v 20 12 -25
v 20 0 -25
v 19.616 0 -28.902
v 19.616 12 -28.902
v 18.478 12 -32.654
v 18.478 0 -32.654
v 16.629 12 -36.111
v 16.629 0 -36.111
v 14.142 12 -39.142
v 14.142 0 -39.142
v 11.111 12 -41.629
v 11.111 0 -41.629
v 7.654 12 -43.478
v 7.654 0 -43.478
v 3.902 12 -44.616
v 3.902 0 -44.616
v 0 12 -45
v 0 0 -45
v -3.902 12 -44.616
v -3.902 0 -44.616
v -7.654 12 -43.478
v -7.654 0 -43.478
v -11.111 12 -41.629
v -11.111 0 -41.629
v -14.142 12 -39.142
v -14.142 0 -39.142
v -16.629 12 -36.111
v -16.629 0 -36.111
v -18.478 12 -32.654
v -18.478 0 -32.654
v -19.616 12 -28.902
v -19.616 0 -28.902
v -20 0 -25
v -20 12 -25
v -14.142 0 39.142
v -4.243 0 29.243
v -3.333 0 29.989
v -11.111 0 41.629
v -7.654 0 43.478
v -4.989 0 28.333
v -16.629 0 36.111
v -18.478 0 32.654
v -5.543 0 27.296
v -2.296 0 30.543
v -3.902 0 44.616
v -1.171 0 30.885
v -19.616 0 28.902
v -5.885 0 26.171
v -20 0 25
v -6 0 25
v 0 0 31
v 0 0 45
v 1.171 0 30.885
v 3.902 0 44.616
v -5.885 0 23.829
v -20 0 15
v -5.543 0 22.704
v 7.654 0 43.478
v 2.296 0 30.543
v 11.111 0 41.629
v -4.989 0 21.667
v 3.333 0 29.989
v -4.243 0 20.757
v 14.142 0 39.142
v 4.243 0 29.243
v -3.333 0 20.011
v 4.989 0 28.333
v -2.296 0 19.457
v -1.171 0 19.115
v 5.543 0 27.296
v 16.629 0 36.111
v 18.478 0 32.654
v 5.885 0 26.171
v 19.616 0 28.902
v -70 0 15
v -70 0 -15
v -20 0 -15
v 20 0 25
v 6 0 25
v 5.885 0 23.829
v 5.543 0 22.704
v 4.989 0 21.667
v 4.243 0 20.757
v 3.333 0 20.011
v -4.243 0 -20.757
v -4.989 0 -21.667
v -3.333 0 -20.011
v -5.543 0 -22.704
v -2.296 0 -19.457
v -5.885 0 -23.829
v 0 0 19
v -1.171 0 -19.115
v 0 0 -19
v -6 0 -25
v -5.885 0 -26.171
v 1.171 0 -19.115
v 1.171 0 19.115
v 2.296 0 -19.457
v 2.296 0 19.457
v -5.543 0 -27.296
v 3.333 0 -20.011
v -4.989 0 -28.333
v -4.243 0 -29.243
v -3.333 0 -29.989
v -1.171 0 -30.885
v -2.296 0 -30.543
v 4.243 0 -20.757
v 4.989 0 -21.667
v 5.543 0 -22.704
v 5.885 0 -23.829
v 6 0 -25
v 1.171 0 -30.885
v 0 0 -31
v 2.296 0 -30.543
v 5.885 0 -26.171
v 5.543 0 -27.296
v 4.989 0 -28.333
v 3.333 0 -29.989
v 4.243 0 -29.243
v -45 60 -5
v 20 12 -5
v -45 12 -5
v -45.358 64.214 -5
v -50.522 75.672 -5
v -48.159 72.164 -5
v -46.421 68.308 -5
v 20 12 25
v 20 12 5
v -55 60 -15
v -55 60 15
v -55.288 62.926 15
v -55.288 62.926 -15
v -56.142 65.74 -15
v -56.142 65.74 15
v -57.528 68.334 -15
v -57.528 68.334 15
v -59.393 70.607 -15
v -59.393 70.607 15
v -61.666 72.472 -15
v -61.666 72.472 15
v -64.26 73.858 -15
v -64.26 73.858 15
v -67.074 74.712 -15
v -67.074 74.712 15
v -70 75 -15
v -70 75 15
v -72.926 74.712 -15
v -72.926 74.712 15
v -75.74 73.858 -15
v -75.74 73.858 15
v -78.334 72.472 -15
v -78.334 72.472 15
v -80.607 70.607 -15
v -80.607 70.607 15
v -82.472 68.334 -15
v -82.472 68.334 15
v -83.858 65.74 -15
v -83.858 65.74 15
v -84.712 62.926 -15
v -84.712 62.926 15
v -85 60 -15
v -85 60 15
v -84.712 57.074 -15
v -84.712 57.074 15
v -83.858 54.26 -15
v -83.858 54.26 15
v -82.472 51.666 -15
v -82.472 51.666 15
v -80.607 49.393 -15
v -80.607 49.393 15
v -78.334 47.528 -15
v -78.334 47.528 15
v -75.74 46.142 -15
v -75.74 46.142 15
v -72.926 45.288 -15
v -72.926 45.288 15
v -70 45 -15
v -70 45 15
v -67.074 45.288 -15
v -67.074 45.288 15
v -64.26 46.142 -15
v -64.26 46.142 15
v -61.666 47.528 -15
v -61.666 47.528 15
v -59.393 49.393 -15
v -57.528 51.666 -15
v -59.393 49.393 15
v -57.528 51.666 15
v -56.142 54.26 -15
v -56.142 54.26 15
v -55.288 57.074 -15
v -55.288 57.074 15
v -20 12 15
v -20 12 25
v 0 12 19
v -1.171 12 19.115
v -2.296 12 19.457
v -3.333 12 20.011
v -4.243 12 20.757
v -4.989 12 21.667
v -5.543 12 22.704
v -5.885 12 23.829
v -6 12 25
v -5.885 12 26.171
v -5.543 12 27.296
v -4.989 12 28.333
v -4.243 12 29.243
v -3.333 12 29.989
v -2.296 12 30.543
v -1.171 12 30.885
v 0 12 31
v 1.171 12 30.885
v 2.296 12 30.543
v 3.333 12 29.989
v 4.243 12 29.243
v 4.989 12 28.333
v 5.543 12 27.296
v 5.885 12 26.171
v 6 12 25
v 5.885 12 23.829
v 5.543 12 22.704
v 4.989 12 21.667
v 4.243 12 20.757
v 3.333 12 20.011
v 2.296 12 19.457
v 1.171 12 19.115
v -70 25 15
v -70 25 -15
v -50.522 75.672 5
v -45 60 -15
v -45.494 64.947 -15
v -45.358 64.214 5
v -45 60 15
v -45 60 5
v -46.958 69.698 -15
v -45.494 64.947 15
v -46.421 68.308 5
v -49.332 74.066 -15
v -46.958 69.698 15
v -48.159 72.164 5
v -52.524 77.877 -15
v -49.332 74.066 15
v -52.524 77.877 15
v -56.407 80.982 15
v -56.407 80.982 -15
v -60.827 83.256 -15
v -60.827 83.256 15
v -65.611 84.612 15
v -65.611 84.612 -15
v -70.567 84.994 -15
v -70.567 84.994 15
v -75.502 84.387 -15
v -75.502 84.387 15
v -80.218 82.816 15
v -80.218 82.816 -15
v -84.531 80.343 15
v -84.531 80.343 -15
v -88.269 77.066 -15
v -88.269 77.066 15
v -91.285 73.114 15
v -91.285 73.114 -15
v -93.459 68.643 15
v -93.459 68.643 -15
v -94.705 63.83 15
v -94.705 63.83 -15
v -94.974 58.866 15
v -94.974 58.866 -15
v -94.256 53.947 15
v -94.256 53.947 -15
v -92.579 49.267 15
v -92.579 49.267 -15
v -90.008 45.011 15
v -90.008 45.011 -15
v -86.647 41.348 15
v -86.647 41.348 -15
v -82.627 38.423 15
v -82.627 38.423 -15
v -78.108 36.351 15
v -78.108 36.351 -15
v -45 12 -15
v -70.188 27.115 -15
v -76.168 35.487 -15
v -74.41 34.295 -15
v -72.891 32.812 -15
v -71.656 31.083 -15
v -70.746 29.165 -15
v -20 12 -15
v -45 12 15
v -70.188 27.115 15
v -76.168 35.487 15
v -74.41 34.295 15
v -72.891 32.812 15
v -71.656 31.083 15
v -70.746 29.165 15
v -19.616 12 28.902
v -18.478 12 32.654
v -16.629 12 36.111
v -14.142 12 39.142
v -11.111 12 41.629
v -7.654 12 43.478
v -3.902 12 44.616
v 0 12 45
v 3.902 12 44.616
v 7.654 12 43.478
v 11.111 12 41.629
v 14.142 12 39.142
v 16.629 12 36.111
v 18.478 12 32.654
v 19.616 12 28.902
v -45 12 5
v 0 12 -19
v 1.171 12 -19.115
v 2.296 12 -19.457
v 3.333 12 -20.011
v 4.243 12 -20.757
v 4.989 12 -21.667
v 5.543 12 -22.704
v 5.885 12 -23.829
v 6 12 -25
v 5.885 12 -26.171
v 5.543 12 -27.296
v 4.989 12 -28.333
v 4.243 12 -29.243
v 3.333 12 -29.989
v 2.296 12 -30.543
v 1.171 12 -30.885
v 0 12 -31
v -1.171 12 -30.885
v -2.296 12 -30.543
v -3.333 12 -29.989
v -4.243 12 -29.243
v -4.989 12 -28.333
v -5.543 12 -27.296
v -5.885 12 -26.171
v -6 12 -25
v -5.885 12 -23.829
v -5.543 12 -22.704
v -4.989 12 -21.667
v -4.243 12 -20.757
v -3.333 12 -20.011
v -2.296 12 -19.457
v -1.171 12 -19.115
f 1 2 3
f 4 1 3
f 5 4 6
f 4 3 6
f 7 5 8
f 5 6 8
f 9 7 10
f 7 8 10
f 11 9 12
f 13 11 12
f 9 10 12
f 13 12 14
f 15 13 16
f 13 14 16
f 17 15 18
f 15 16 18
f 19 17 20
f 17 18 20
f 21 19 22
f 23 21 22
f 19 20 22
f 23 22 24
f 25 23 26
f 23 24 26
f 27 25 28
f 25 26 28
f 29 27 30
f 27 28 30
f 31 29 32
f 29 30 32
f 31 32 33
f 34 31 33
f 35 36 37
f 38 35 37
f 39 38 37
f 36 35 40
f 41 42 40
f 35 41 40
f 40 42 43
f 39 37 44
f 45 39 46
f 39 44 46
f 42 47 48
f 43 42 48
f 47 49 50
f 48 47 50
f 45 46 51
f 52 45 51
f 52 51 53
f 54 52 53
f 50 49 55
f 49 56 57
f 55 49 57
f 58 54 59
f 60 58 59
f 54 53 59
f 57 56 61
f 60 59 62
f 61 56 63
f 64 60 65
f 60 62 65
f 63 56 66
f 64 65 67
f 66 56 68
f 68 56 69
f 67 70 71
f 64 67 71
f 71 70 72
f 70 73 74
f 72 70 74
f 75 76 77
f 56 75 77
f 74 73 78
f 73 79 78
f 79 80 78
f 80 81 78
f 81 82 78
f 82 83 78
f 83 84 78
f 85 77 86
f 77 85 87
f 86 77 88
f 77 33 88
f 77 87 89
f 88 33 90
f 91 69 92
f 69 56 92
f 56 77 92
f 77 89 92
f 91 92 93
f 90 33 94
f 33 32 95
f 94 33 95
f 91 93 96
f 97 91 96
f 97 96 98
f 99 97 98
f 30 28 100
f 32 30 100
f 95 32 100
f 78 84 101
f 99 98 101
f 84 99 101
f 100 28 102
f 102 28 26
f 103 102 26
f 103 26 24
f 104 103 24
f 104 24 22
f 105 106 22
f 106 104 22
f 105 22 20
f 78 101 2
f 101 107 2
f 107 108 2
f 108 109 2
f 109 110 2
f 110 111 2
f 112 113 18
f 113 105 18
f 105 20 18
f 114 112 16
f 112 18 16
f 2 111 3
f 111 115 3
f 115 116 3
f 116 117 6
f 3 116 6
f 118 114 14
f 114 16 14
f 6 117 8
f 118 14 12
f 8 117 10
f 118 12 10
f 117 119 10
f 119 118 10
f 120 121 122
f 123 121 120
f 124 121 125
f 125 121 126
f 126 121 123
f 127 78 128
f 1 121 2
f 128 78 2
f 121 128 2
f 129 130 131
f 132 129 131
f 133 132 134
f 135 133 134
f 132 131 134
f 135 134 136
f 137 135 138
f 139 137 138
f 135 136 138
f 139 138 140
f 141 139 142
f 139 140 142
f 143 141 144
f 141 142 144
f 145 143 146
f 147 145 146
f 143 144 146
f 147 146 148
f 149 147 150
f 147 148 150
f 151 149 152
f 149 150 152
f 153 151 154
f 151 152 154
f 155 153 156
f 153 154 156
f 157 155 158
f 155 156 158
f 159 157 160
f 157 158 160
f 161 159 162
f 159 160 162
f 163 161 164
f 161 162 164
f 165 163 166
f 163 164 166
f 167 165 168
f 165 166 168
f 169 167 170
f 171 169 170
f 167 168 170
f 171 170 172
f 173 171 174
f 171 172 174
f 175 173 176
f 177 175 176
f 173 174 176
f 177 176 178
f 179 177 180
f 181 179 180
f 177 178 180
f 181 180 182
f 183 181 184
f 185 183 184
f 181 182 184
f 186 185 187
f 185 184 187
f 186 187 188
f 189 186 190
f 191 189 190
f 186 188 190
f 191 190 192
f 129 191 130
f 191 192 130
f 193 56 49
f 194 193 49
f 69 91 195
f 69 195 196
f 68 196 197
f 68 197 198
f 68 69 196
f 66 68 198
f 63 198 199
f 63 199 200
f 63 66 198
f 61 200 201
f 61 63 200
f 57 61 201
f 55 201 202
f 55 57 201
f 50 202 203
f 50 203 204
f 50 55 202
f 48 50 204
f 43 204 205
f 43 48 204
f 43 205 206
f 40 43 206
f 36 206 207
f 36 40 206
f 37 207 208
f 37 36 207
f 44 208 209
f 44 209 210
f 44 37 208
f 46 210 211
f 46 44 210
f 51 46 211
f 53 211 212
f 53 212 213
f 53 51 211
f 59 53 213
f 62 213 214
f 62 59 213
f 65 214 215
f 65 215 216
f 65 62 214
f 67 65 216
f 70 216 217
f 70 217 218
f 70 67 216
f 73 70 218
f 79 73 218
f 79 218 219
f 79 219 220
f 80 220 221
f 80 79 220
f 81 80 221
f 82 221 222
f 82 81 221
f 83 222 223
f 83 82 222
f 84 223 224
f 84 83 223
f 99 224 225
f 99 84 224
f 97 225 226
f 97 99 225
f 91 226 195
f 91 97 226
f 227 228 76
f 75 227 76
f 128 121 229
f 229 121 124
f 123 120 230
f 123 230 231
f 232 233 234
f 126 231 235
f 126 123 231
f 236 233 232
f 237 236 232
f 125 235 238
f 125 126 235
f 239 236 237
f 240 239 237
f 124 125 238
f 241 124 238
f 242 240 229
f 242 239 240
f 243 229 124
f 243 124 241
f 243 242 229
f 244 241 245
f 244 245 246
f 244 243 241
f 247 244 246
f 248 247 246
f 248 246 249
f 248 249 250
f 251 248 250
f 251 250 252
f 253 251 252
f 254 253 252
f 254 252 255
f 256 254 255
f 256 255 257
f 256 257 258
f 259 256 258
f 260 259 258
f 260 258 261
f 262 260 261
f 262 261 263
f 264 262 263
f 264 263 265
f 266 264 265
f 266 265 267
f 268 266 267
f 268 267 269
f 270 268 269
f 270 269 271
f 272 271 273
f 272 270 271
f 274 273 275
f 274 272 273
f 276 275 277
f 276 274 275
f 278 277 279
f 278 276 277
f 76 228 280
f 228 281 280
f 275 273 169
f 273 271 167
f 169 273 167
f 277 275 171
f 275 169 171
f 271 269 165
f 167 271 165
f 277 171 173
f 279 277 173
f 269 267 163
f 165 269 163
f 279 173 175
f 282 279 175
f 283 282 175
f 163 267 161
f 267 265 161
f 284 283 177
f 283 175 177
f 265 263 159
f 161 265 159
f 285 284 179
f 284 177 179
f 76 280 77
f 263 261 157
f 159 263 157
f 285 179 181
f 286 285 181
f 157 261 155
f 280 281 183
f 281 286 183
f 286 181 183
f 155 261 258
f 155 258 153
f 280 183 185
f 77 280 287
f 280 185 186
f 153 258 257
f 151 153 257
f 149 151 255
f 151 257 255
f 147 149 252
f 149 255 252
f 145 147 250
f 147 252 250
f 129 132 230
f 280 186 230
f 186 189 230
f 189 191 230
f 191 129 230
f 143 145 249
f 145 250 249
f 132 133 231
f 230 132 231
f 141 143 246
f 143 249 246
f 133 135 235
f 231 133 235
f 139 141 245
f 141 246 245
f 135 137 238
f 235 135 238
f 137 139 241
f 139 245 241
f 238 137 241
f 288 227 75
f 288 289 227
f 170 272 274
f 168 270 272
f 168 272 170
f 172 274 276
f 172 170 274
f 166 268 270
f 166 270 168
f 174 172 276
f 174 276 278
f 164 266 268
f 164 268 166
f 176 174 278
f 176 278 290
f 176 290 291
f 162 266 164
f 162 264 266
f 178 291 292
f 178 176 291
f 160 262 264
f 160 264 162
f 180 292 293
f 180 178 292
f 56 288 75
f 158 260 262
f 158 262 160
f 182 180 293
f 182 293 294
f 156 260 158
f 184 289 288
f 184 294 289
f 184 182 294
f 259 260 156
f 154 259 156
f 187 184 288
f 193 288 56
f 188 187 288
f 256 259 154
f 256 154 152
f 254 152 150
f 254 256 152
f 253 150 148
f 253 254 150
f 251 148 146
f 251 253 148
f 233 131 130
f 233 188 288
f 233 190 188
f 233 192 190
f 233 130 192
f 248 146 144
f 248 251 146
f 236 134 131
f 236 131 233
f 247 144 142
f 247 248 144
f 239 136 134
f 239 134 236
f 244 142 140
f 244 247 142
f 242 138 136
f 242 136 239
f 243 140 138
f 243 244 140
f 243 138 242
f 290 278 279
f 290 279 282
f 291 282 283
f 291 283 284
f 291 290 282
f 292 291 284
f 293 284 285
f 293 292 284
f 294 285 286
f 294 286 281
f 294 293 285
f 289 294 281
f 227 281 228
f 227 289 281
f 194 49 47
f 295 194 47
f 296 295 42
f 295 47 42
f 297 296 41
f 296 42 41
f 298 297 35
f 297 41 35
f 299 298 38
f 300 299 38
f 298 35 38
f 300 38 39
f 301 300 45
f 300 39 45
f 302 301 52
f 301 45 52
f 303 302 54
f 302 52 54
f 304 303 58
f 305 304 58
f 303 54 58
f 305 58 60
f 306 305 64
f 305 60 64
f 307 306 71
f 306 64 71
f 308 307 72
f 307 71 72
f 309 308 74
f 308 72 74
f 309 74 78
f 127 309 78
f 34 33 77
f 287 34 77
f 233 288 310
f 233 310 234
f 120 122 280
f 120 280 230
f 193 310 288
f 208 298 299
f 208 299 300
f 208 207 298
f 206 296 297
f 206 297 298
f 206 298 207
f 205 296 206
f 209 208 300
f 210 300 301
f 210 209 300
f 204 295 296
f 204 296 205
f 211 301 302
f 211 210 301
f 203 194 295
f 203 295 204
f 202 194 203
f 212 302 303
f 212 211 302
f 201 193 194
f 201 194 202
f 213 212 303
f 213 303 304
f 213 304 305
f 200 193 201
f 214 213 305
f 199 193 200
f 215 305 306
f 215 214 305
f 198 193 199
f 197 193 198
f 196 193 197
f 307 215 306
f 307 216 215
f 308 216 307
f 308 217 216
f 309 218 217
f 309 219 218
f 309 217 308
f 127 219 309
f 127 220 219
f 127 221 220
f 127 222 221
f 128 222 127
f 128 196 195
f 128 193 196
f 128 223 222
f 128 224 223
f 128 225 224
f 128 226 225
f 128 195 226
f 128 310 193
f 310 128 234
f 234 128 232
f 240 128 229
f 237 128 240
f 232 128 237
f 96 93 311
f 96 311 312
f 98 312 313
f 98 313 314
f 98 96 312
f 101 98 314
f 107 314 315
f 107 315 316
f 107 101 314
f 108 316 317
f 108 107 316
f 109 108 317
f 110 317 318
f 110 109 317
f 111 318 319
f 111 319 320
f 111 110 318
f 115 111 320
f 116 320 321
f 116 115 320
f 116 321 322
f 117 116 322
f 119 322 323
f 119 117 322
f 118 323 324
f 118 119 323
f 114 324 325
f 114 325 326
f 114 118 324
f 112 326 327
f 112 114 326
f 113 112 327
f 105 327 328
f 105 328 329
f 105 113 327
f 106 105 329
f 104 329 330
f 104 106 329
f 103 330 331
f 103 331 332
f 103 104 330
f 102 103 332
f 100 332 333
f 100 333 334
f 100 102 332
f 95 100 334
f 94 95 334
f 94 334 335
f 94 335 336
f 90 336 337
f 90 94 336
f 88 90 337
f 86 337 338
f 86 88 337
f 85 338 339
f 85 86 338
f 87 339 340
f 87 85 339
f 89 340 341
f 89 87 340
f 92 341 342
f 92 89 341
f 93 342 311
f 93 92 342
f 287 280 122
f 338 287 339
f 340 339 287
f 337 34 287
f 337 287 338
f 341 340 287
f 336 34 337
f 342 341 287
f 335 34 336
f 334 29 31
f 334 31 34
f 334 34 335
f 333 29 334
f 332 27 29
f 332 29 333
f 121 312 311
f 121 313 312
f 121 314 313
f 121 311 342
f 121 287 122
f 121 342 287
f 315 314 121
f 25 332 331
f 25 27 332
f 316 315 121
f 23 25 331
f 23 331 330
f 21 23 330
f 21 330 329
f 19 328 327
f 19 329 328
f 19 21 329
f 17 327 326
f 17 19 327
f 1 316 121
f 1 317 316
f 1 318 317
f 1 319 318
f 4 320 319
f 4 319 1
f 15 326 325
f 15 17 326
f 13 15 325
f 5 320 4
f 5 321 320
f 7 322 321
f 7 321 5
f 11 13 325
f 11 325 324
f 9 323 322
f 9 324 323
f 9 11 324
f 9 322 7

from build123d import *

# Parameters (mm, degrees)
SKETCH2_R           = 6
BOSS_EXTRUDE1_DEPTH = 12
SKETCH4_R           = 15
BOSS_EXTRUDE3_DEPTH = 30
RIB10_REACH         = 137.185
SKETCH8_WALL_W      = 367.382862114
SKETCH8_WALL_H      = 10


with BuildPart() as part:
    # Sketch2 → Boss-Extrude1 (new body)
    with BuildSketch(Plane(origin=(0, 0, 0), x_dir=(1, 0, 0), z_dir=(0, 1, 0))):
        with BuildLine():
            Line((20, -25), (20, 25))
            ThreePointArc((20, 25), (0, 45), (-20, 25))
            Line((-20, 25), (-20, 15))
            Line((-20, 15), (-70, 15))
            Line((-70, 15), (-70, -15))
            Line((-70, -15), (-20, -15))
            Line((-20, -15), (-20, -25))
            ThreePointArc((-20, -25), (0, -45), (20, -25))
        make_face()
        with Locations(Location((0, 25, 0), (0, 0, 270))):
            Circle(SKETCH2_R, mode=Mode.SUBTRACT)
        with Locations(Location((0, -25, 0), (0, 0, 90))):
            Circle(SKETCH2_R, mode=Mode.SUBTRACT)
    extrude(amount=BOSS_EXTRUDE1_DEPTH)

    # Sketch4 → Boss-Extrude3 (add)
    with BuildSketch(Plane.XY.offset(15)):
        with BuildLine():
            Line((-70, 25), (-70, 12))
            Line((-70, 12), (-45, 12))
            Line((-45, 12), (-45, 60))
            ThreePointArc((-45, 60), (-84.530954843, 80.34333678), (-78.108108108, 36.351351351))
            ThreePointArc((-78.108108108, 36.351351351), (-72.235198346, 31.974858325), (-70, 25))
        make_face()
        with Locations((-70, 60)):
            Circle(SKETCH4_R, mode=Mode.SUBTRACT)
    extrude(amount=-BOSS_EXTRUDE3_DEPTH)

    # Sketch8 wall → Rib10 (add, up to next)
    with BuildSketch(Plane(origin=(-15.260936943, 43.835856736, 0), x_dir=(-0.742235934483, 0.670138655476, 0), z_dir=(-0.670138655476, -0.742235934483, 0)), mode=Mode.PRIVATE) as rib10_sk1:
        Rectangle(SKETCH8_WALL_W, SKETCH8_WALL_H)
    rib10_tool1 = extrude(rib10_sk1.sketch, amount=RIB10_REACH, mode=Mode.PRIVATE) - part.part
    add(rib10_tool1.solids().sort_by_distance((-15.260936943, 43.835856736, 0))[0])


solid = part.part
